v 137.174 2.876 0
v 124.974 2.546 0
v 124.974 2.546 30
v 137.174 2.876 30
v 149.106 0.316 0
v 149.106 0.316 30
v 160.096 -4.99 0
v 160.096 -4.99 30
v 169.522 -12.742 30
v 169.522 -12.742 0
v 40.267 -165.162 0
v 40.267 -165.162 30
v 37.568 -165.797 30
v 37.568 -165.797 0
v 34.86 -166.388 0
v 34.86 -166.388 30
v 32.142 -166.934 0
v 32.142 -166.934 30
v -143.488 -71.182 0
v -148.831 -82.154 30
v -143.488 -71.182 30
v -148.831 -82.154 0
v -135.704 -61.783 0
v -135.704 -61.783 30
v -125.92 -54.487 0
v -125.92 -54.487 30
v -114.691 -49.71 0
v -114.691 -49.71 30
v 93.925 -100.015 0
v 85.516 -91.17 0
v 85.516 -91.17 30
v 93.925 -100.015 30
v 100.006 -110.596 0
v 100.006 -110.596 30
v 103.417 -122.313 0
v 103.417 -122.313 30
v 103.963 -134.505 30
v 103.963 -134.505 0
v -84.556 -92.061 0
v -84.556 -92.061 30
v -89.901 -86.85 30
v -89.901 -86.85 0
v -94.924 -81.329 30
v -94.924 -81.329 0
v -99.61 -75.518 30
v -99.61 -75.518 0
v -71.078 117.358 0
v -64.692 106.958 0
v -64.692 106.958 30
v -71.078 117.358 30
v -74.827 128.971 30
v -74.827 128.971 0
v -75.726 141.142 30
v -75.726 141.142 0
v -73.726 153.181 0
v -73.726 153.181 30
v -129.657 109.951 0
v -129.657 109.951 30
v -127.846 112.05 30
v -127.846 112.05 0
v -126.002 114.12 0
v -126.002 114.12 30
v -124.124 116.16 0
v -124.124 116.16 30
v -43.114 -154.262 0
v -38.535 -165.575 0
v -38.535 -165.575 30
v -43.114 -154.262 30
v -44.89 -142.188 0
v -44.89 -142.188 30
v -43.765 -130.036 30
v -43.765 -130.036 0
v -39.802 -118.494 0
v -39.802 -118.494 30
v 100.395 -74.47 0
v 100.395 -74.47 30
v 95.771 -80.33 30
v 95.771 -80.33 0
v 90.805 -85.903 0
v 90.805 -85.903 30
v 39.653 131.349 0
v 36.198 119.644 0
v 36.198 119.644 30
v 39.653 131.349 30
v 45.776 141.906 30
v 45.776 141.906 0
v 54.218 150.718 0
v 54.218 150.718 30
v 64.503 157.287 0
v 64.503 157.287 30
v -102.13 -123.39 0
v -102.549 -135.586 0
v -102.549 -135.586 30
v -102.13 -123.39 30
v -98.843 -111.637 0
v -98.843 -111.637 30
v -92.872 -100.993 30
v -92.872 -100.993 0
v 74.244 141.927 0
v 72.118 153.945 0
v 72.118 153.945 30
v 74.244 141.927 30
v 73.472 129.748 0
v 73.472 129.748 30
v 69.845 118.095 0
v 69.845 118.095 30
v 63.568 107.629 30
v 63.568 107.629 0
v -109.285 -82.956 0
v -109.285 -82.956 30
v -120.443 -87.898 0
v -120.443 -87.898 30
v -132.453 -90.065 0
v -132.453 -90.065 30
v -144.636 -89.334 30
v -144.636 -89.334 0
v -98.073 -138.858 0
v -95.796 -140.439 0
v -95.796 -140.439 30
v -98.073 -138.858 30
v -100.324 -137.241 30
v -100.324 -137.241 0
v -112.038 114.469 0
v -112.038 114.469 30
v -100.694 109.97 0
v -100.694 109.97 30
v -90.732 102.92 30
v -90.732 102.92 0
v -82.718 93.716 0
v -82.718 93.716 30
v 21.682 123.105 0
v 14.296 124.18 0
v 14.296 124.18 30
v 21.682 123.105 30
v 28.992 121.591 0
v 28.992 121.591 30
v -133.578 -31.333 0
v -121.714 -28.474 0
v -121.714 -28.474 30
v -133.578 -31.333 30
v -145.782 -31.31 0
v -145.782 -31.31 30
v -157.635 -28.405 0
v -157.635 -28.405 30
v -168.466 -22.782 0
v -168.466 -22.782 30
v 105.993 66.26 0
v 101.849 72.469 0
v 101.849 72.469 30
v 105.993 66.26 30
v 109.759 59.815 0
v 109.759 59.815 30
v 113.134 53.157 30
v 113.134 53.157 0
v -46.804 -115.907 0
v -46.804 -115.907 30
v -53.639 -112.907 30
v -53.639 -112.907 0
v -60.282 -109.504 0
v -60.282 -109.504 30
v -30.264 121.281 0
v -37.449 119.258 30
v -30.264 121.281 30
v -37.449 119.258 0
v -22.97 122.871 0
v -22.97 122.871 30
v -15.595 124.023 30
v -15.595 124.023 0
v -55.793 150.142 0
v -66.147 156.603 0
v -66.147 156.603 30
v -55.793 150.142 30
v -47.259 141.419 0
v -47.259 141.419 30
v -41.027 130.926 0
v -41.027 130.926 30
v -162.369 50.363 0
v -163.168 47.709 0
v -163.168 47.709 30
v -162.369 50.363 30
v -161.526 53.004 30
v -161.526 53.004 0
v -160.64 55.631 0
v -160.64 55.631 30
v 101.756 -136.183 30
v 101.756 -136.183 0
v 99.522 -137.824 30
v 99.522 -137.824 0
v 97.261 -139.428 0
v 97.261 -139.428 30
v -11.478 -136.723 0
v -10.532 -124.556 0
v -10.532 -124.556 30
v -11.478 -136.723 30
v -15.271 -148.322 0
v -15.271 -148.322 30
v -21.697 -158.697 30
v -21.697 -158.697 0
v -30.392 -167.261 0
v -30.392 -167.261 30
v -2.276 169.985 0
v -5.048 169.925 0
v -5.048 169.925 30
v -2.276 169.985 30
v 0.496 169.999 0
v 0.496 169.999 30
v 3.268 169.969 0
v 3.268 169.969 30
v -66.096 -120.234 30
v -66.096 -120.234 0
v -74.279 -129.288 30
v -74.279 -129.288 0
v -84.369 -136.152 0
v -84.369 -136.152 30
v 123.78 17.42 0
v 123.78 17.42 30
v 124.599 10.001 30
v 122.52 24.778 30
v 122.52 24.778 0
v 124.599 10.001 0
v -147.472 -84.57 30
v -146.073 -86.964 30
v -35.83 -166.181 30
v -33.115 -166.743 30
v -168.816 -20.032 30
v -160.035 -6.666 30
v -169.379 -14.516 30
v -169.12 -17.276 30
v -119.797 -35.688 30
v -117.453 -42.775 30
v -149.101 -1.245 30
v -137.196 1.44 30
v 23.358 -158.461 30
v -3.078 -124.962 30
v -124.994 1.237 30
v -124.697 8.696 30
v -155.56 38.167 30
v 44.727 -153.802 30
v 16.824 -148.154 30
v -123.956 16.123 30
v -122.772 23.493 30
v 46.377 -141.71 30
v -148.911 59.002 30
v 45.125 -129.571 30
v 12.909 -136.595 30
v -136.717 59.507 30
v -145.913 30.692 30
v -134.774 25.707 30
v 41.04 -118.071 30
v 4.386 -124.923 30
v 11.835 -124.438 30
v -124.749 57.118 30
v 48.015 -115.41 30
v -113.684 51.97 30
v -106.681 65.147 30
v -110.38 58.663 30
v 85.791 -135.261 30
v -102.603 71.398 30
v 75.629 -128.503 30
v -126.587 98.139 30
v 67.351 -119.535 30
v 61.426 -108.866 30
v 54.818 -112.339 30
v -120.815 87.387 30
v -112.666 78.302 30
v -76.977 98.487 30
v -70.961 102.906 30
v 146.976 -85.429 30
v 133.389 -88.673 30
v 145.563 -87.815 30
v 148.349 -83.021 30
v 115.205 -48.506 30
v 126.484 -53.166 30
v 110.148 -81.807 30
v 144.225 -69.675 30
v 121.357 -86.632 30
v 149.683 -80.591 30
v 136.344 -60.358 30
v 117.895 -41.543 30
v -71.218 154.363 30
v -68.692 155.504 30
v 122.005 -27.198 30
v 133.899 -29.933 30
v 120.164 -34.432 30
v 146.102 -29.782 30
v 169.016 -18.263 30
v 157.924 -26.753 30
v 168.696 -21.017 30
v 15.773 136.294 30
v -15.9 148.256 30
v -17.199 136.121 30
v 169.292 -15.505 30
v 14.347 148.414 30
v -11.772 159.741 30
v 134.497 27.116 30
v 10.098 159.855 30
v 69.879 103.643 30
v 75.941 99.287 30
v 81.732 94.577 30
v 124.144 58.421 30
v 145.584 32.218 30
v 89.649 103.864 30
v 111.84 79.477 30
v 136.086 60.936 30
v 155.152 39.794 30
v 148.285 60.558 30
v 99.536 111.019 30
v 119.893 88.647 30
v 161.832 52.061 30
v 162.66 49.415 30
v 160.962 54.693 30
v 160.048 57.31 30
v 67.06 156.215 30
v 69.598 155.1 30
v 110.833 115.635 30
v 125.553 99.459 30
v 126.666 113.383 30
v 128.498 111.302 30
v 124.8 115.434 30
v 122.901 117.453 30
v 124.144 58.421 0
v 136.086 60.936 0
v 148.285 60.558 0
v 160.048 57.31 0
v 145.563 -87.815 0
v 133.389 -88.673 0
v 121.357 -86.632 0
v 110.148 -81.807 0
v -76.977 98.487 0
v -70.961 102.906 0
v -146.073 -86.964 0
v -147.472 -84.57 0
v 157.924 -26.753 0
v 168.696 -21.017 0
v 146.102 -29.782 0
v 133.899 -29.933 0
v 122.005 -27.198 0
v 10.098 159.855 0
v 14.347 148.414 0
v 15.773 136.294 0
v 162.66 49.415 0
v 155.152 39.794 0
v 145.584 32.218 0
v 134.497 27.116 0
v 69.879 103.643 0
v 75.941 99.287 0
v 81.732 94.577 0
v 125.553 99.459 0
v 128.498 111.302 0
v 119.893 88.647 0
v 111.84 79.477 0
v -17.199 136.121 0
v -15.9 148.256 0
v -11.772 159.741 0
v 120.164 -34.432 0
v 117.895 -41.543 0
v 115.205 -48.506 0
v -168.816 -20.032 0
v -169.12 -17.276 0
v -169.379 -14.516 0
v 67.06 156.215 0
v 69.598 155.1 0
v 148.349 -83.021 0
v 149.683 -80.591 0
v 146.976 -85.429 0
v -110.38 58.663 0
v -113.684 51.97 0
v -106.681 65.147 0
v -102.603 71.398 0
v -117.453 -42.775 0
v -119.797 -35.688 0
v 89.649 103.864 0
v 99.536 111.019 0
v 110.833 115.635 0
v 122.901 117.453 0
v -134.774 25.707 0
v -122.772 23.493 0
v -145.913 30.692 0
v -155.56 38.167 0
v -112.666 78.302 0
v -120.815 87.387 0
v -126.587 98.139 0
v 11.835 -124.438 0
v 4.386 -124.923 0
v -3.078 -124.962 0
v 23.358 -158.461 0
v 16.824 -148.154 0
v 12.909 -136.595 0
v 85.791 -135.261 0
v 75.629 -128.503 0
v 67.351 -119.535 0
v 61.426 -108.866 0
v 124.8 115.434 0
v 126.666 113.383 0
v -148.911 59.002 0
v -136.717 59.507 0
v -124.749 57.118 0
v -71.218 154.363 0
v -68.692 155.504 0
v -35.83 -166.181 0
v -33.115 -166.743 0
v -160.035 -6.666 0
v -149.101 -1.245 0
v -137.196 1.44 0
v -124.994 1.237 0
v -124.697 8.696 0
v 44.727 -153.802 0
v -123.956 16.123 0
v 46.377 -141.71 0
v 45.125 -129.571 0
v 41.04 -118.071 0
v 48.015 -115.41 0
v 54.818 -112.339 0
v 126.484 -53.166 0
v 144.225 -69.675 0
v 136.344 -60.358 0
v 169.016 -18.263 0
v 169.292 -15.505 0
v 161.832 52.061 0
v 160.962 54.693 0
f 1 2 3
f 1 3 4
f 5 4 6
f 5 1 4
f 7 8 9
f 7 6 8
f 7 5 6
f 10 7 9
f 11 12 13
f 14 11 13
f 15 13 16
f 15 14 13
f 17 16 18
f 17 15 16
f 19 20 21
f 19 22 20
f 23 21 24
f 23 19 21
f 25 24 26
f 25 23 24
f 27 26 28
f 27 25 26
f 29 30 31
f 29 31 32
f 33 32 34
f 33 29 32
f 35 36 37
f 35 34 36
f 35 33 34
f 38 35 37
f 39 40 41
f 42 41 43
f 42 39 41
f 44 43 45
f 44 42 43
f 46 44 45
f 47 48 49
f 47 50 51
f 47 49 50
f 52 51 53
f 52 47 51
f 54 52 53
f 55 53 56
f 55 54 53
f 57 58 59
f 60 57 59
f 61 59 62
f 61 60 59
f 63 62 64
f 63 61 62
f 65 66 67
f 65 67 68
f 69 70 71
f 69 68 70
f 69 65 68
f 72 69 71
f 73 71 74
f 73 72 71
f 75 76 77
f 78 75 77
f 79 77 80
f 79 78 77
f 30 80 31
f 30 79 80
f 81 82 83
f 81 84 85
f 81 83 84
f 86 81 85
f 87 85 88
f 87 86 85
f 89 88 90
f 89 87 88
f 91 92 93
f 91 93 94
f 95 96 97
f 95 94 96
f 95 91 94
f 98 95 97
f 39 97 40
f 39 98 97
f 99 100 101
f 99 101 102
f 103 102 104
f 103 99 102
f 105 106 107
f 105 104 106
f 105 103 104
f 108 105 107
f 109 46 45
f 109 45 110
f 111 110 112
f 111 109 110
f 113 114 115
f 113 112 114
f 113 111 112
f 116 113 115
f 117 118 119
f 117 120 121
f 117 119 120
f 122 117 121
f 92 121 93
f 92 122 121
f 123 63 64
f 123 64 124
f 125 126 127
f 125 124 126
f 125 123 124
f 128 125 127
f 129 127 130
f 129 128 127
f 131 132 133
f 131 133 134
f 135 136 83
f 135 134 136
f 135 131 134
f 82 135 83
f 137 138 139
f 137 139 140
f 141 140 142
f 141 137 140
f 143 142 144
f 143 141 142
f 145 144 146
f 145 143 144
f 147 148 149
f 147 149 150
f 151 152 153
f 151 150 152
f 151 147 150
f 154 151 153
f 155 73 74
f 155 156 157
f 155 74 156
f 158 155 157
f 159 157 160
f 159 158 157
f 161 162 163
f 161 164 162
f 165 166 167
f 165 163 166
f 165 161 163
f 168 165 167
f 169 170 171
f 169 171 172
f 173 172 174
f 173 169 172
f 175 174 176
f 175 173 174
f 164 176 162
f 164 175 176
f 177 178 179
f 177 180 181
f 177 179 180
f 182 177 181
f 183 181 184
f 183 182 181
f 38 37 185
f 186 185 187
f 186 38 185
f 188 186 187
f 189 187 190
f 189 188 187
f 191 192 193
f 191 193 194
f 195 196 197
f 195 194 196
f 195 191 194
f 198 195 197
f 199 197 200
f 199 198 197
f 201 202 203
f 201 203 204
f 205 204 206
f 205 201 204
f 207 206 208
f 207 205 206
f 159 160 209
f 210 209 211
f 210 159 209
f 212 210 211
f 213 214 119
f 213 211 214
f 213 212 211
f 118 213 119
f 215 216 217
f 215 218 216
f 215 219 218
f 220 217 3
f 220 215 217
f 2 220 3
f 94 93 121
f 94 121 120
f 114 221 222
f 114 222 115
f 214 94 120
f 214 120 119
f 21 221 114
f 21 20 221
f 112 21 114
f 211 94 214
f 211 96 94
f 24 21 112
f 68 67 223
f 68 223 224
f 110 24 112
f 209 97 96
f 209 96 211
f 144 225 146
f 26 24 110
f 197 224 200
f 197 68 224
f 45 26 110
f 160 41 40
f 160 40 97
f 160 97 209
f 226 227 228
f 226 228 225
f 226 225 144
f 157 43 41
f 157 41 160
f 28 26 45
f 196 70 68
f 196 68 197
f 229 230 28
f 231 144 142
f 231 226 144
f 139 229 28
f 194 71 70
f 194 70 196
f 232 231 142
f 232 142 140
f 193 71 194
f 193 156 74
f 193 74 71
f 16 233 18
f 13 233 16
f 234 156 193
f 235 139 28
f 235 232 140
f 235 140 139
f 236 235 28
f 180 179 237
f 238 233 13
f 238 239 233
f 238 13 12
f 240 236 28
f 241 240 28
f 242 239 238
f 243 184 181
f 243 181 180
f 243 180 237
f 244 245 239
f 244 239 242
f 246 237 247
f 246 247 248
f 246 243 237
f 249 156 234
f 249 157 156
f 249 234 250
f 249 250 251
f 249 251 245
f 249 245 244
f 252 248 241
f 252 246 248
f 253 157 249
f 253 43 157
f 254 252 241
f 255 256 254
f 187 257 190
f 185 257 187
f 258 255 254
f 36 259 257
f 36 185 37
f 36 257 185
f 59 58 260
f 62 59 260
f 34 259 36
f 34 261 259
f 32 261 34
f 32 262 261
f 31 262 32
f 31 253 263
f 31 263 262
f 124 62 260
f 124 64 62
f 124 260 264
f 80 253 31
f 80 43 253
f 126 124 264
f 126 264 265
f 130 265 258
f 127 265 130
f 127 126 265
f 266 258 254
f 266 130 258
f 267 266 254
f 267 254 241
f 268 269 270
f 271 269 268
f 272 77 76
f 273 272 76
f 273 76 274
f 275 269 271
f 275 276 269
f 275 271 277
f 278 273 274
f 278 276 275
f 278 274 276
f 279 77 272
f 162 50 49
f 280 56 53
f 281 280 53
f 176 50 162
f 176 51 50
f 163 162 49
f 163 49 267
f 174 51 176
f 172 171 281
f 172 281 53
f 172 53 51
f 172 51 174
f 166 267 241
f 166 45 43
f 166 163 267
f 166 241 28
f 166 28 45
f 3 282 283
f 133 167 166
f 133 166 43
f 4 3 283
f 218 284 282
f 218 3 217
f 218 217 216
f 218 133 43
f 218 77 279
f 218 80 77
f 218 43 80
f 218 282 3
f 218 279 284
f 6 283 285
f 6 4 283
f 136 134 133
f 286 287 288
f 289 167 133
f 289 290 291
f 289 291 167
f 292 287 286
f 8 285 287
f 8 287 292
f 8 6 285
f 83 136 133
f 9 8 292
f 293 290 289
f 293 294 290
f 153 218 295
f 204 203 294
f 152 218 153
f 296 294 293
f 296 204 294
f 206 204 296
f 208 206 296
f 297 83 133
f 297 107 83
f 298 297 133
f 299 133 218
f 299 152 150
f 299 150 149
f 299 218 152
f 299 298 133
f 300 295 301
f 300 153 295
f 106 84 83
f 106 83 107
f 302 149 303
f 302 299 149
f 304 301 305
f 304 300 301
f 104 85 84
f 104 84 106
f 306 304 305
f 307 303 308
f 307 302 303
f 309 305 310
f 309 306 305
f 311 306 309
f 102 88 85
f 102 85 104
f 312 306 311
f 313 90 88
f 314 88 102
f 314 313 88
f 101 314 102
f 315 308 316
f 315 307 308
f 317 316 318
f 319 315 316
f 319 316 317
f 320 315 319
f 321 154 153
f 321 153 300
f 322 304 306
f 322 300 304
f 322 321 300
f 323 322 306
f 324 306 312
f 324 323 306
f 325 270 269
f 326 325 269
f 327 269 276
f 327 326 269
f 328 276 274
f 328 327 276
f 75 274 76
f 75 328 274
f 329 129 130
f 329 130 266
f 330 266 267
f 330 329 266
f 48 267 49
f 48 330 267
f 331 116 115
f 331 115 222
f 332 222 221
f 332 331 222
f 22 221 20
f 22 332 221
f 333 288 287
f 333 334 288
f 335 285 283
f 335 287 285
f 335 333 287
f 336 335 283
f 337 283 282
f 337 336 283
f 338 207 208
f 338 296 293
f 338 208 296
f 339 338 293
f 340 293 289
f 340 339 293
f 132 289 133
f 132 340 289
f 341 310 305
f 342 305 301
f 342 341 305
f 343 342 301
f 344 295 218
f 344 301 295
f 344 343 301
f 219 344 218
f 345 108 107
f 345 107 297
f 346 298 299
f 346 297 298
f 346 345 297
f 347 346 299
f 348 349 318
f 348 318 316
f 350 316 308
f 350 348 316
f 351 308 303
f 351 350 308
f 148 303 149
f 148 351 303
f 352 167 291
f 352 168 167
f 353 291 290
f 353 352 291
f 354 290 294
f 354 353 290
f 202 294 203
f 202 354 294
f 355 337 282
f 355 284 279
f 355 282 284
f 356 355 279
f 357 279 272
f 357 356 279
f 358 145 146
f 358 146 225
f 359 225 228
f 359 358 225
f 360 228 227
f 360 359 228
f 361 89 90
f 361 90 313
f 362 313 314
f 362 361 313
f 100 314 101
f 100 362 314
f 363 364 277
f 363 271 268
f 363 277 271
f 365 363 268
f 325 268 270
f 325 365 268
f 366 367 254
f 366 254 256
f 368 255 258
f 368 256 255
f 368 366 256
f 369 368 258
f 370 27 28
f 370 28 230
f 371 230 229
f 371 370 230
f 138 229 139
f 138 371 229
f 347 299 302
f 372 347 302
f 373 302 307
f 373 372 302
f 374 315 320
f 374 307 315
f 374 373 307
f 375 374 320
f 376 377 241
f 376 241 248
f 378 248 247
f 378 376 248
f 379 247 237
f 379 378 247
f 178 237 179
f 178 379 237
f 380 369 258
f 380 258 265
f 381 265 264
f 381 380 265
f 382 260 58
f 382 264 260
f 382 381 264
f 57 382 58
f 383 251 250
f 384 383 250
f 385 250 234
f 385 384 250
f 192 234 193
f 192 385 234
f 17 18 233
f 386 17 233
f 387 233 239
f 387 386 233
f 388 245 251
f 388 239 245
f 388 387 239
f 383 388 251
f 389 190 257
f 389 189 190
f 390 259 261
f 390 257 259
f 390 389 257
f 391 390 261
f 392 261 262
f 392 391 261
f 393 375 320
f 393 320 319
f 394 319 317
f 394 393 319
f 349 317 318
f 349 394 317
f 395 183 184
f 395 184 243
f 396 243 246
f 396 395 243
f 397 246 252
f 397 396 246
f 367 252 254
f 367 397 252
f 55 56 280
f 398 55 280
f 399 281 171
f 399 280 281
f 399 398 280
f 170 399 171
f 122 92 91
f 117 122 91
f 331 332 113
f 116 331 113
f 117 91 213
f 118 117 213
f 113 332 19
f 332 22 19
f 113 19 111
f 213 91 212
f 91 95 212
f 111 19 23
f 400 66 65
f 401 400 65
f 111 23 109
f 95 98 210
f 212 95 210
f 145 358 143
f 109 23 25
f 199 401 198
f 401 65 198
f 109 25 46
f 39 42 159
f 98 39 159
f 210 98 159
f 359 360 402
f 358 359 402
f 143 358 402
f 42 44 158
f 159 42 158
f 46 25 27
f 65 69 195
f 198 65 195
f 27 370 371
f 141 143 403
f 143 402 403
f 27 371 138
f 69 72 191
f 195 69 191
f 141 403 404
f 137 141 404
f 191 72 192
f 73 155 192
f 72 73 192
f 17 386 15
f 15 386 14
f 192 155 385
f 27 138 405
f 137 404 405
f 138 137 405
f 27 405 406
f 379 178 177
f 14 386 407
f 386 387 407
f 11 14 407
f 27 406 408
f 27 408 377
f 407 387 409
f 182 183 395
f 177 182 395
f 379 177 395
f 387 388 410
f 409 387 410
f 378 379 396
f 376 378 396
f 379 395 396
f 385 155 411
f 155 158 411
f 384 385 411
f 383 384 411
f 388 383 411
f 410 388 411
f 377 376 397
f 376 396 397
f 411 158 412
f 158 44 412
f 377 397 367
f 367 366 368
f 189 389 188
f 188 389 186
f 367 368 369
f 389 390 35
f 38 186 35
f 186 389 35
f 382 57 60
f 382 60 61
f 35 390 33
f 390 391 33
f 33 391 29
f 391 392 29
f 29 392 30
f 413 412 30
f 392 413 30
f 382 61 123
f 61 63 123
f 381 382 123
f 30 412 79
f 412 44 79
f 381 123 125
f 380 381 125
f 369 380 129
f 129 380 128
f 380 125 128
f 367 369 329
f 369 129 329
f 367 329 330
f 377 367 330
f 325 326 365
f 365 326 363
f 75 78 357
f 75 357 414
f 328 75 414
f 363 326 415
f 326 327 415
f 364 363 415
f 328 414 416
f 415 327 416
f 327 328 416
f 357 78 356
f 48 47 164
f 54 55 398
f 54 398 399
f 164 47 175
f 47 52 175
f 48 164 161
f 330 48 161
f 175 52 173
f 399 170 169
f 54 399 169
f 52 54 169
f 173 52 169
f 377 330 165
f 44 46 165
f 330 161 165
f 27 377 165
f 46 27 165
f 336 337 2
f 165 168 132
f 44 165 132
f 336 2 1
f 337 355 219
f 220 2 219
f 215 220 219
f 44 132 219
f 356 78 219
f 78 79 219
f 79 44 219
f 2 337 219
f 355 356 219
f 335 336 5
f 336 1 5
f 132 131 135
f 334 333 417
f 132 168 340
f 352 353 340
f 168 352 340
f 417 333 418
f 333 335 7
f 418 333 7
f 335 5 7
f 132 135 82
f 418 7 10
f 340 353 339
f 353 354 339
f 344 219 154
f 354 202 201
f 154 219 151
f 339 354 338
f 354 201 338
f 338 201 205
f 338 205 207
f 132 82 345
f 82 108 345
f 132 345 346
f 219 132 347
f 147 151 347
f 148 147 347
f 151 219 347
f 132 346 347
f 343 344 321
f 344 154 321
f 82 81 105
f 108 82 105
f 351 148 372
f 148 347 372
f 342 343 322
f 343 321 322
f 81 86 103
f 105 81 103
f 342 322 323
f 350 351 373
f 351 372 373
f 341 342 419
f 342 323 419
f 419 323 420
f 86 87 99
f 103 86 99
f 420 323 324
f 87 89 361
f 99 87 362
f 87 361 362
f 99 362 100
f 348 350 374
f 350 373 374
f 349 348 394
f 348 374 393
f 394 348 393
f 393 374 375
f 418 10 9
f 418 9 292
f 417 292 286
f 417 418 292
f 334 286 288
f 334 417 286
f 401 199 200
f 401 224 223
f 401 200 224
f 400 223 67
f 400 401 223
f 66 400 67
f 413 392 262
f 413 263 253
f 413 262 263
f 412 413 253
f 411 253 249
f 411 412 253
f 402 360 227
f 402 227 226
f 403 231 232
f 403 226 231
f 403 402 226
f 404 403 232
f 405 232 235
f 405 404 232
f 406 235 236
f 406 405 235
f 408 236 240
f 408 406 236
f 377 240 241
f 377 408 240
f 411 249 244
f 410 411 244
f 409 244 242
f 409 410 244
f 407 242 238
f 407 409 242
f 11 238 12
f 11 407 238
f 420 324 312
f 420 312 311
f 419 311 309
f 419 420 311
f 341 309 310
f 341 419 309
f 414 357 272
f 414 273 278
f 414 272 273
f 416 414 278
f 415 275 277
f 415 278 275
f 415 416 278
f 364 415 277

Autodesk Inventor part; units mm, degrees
ref_plane "YZ Plane" through (0, 0, 0) normal (1, 0, 0) x (0, 1, 0)
ref_plane "XZ Plane" through (0, 0, 0) normal (0, 1, 0) x (-1, 0, 0)
ref_plane "XY Plane" through (0, 0, 0) normal (0, 0, 1) x (1, 0, 0)
sketch "Boceto1" plane through (0, 0, 0) normal (0, 0, 1) x (1, 0, 0)
  arc A0 (168.6959, -21.0168) -> (169.5218, -12.7418) centre (0, 0) ccw
  arc A1 (169.5218, -12.7418) -> (124.9741, 2.5458) centre (132.4533, -48.2091) ccw
  arc A2 (122.0053, -27.1977) -> (168.6959, -21.0168) centre (139.3691, 21.0776) ccw
  arc A3 (162.6596, 49.415) -> (160.0484, 57.3105) centre (0, 0) ccw
  arc A4 (160.0484, 57.3105) -> (113.134, 53.1573) centre (140.6105, 9.8324) ccw
  arc A5 (122.5196, 24.7777) -> (162.6596, 49.415) centre (118.7469, 75.9418) ccw
  arc A6 (128.4981, 111.3025) -> (122.9012, 117.4533) centre (0, 0) ccw
  arc A7 (122.9012, 117.4533) -> (81.7321, 94.5773) centre (124.4549, 66.1738) ccw
  arc A8 (101.8493, 72.4688) -> (128.4981, 111.3025) centre (77.5924, 117.6751) ccw
  arc A9 (72.1181, 153.9447) -> (64.5033, 157.2874) centre (0, 0) ccw
  arc A10 (64.5033, 157.2874) -> (36.1979, 119.6441) centre (86.7799, 111.0732) ccw
  arc A11 (63.5682, 107.6294) -> (72.1181, 153.9447) centre (23.0214, 139.0612) ccw
  arc A12 (3.2682, 169.9686) -> (-5.0479, 169.925) centre (0, 0) ccw
  arc A13 (-5.0479, 169.925) -> (-15.5952, 124.0233) centre (34.0998, 136.767) ccw
  arc A14 (14.2956, 124.1798) -> (3.2682, 169.9686) centre (-35.5302, 136.4024) ccw
  arc A15 (-66.1468, 156.6033) -> (-73.7262, 153.1811) centre (0, 0) ccw
  arc A16 (-73.7262, 153.1811) -> (-64.6918, 106.9578) centre (-24.4764, 138.8125) ccw
  arc A17 (-37.4488, 119.2585) -> (-66.1468, 156.6033) centre (-87.9383, 110.1584) ccw
  arc A18 (-124.1244, 116.1599) -> (-129.6566, 109.9508) centre (0, 0) ccw
  arc A19 (-129.6566, 109.9508) -> (-102.6026, 71.3983) centre (-78.8204, 116.8561) ccw
  arc A20 (-82.718, 93.7163) -> (-124.1244, 116.1599) centre (-125.141, 64.867) ccw
  arc A21 (-160.6398, 55.6314) -> (-163.1682, 47.7089) centre (0, 0) ccw
  arc A22 (-163.1682, 47.7089) -> (-122.7724, 23.4934) centre (-119.5357, 74.6942) ccw
  arc A23 (-113.6845, 51.9696) -> (-160.6398, 55.6314) centre (-140.7058, 8.3595) ccw
  arc A24 (-169.3791, -14.5163) -> (-168.4665, -22.7822) centre (0, 0) ccw
  arc A25 (-168.4665, -22.7822) -> (-121.7138, -28.4738) centre (-139.5821, 19.617) ccw
  arc A26 (-124.9939, 1.237) -> (-169.3791, -14.5163) centre (-131.9412, -49.5935) ccw
  arc A27 (-148.8312, -82.154) -> (-144.6355, -89.3341) centre (0, 0) ccw
  arc A28 (-144.6355, -89.3341) -> (-99.6097, -75.5175) centre (-135.4936, -38.8522) ccw
  arc A29 (-114.6907, -49.7095) -> (-148.8312, -82.154) centre (-100.3628, -98.9712) ccw
  arc A30 (-102.549, -135.5865) -> (-95.7956, -140.4393) centre (0, 0) ccw
  arc A31 (-95.7956, -140.4393) -> (-60.2823, -109.5036) centre (-107.9769, -90.6034) ccw
  arc A32 (-84.5565, -92.0608) -> (-102.549, -135.5865) centre (-51.4308, -131.2359) ccw
  arc A33 (-38.5352, -165.5749) -> (-30.3919, -167.2613) centre (0, 0) ccw
  arc A34 (-30.3919, -167.2613) -> (-10.5315, -124.5556) centre (-61.7901, -126.6885) ccw
  arc A35 (-39.8017, -118.494) -> (-38.5352, -165.5749) centre (6.3941, -140.8088) ccw
  arc A36 (32.1417, -166.9339) -> (40.267, -165.1623) centre (0, 0) ccw
  arc A37 (40.267, -165.1623) -> (41.0403, -118.0707) centre (-4.9192, -140.868) ccw
  arc A38 (11.8352, -124.4385) -> (32.1417, -166.9339) centre (63.1134, -126.0345) ccw
  arc A39 (97.261, -139.4285) -> (103.9632, -134.5052) centre (0, 0) ccw
  arc A40 (103.9632, -134.5052) -> (85.5159, -91.1703) centre (52.8023, -130.6902) ccw
  arc A41 (61.4257, -108.8664) -> (97.261, -139.4285) centre (108.9198, -89.4677) ccw
  arc A42 (145.563, -87.8146) -> (149.6833, -80.5909) centre (0, 0) ccw
  arc A43 (149.6833, -80.5909) -> (115.205, -48.5058) centre (101.3937, -97.9148) ccw
  arc A44 (100.3951, -74.4703) -> (145.563, -87.8146) centre (135.893, -37.4312) ccw
  arc A45 (113.134, 53.1573) -> (101.8493, 72.4688) centre (0, 0) ccw
  arc A46 (124.9741, 2.5458) -> (122.5196, 24.7777) centre (0, 0) ccw
  arc A47 (115.205, -48.5058) -> (122.0053, -27.1977) centre (0, 0) ccw
  arc A48 (85.5159, -91.1703) -> (100.3951, -74.4703) centre (0, 0) ccw
  arc A49 (41.0403, -118.0707) -> (61.4257, -108.8664) centre (0, 0) ccw
  arc A50 (-10.5315, -124.5556) -> (11.8352, -124.4385) centre (0, 0) ccw
  arc A51 (-60.2823, -109.5036) -> (-39.8017, -118.494) centre (0, 0) ccw
  arc A52 (-99.6097, -75.5175) -> (-84.5565, -92.0608) centre (0, 0) ccw
  arc A53 (-121.7138, -28.4738) -> (-114.6907, -49.7095) centre (0, 0) ccw
  arc A54 (-122.7724, 23.4934) -> (-124.9939, 1.237) centre (0, 0) ccw
  arc A55 (-102.6026, 71.3983) -> (-113.6845, 51.9696) centre (0, 0) ccw
  arc A56 (-64.6918, 106.9578) -> (-82.718, 93.7163) centre (0, 0) ccw
  arc A57 (-15.5952, 124.0233) -> (-37.4488, 119.2585) centre (0, 0) ccw
  arc A58 (81.7321, 94.5773) -> (63.5682, 107.6294) centre (0, 0) ccw
  arc A59 (36.1979, 119.6441) -> (14.2956, 124.1798) centre (0, 0) ccw
  dimension "d8" = 360
extrude "Extrusión1" add sketch "Boceto1" along normal blind 30
properties part number "15P_Recto"
